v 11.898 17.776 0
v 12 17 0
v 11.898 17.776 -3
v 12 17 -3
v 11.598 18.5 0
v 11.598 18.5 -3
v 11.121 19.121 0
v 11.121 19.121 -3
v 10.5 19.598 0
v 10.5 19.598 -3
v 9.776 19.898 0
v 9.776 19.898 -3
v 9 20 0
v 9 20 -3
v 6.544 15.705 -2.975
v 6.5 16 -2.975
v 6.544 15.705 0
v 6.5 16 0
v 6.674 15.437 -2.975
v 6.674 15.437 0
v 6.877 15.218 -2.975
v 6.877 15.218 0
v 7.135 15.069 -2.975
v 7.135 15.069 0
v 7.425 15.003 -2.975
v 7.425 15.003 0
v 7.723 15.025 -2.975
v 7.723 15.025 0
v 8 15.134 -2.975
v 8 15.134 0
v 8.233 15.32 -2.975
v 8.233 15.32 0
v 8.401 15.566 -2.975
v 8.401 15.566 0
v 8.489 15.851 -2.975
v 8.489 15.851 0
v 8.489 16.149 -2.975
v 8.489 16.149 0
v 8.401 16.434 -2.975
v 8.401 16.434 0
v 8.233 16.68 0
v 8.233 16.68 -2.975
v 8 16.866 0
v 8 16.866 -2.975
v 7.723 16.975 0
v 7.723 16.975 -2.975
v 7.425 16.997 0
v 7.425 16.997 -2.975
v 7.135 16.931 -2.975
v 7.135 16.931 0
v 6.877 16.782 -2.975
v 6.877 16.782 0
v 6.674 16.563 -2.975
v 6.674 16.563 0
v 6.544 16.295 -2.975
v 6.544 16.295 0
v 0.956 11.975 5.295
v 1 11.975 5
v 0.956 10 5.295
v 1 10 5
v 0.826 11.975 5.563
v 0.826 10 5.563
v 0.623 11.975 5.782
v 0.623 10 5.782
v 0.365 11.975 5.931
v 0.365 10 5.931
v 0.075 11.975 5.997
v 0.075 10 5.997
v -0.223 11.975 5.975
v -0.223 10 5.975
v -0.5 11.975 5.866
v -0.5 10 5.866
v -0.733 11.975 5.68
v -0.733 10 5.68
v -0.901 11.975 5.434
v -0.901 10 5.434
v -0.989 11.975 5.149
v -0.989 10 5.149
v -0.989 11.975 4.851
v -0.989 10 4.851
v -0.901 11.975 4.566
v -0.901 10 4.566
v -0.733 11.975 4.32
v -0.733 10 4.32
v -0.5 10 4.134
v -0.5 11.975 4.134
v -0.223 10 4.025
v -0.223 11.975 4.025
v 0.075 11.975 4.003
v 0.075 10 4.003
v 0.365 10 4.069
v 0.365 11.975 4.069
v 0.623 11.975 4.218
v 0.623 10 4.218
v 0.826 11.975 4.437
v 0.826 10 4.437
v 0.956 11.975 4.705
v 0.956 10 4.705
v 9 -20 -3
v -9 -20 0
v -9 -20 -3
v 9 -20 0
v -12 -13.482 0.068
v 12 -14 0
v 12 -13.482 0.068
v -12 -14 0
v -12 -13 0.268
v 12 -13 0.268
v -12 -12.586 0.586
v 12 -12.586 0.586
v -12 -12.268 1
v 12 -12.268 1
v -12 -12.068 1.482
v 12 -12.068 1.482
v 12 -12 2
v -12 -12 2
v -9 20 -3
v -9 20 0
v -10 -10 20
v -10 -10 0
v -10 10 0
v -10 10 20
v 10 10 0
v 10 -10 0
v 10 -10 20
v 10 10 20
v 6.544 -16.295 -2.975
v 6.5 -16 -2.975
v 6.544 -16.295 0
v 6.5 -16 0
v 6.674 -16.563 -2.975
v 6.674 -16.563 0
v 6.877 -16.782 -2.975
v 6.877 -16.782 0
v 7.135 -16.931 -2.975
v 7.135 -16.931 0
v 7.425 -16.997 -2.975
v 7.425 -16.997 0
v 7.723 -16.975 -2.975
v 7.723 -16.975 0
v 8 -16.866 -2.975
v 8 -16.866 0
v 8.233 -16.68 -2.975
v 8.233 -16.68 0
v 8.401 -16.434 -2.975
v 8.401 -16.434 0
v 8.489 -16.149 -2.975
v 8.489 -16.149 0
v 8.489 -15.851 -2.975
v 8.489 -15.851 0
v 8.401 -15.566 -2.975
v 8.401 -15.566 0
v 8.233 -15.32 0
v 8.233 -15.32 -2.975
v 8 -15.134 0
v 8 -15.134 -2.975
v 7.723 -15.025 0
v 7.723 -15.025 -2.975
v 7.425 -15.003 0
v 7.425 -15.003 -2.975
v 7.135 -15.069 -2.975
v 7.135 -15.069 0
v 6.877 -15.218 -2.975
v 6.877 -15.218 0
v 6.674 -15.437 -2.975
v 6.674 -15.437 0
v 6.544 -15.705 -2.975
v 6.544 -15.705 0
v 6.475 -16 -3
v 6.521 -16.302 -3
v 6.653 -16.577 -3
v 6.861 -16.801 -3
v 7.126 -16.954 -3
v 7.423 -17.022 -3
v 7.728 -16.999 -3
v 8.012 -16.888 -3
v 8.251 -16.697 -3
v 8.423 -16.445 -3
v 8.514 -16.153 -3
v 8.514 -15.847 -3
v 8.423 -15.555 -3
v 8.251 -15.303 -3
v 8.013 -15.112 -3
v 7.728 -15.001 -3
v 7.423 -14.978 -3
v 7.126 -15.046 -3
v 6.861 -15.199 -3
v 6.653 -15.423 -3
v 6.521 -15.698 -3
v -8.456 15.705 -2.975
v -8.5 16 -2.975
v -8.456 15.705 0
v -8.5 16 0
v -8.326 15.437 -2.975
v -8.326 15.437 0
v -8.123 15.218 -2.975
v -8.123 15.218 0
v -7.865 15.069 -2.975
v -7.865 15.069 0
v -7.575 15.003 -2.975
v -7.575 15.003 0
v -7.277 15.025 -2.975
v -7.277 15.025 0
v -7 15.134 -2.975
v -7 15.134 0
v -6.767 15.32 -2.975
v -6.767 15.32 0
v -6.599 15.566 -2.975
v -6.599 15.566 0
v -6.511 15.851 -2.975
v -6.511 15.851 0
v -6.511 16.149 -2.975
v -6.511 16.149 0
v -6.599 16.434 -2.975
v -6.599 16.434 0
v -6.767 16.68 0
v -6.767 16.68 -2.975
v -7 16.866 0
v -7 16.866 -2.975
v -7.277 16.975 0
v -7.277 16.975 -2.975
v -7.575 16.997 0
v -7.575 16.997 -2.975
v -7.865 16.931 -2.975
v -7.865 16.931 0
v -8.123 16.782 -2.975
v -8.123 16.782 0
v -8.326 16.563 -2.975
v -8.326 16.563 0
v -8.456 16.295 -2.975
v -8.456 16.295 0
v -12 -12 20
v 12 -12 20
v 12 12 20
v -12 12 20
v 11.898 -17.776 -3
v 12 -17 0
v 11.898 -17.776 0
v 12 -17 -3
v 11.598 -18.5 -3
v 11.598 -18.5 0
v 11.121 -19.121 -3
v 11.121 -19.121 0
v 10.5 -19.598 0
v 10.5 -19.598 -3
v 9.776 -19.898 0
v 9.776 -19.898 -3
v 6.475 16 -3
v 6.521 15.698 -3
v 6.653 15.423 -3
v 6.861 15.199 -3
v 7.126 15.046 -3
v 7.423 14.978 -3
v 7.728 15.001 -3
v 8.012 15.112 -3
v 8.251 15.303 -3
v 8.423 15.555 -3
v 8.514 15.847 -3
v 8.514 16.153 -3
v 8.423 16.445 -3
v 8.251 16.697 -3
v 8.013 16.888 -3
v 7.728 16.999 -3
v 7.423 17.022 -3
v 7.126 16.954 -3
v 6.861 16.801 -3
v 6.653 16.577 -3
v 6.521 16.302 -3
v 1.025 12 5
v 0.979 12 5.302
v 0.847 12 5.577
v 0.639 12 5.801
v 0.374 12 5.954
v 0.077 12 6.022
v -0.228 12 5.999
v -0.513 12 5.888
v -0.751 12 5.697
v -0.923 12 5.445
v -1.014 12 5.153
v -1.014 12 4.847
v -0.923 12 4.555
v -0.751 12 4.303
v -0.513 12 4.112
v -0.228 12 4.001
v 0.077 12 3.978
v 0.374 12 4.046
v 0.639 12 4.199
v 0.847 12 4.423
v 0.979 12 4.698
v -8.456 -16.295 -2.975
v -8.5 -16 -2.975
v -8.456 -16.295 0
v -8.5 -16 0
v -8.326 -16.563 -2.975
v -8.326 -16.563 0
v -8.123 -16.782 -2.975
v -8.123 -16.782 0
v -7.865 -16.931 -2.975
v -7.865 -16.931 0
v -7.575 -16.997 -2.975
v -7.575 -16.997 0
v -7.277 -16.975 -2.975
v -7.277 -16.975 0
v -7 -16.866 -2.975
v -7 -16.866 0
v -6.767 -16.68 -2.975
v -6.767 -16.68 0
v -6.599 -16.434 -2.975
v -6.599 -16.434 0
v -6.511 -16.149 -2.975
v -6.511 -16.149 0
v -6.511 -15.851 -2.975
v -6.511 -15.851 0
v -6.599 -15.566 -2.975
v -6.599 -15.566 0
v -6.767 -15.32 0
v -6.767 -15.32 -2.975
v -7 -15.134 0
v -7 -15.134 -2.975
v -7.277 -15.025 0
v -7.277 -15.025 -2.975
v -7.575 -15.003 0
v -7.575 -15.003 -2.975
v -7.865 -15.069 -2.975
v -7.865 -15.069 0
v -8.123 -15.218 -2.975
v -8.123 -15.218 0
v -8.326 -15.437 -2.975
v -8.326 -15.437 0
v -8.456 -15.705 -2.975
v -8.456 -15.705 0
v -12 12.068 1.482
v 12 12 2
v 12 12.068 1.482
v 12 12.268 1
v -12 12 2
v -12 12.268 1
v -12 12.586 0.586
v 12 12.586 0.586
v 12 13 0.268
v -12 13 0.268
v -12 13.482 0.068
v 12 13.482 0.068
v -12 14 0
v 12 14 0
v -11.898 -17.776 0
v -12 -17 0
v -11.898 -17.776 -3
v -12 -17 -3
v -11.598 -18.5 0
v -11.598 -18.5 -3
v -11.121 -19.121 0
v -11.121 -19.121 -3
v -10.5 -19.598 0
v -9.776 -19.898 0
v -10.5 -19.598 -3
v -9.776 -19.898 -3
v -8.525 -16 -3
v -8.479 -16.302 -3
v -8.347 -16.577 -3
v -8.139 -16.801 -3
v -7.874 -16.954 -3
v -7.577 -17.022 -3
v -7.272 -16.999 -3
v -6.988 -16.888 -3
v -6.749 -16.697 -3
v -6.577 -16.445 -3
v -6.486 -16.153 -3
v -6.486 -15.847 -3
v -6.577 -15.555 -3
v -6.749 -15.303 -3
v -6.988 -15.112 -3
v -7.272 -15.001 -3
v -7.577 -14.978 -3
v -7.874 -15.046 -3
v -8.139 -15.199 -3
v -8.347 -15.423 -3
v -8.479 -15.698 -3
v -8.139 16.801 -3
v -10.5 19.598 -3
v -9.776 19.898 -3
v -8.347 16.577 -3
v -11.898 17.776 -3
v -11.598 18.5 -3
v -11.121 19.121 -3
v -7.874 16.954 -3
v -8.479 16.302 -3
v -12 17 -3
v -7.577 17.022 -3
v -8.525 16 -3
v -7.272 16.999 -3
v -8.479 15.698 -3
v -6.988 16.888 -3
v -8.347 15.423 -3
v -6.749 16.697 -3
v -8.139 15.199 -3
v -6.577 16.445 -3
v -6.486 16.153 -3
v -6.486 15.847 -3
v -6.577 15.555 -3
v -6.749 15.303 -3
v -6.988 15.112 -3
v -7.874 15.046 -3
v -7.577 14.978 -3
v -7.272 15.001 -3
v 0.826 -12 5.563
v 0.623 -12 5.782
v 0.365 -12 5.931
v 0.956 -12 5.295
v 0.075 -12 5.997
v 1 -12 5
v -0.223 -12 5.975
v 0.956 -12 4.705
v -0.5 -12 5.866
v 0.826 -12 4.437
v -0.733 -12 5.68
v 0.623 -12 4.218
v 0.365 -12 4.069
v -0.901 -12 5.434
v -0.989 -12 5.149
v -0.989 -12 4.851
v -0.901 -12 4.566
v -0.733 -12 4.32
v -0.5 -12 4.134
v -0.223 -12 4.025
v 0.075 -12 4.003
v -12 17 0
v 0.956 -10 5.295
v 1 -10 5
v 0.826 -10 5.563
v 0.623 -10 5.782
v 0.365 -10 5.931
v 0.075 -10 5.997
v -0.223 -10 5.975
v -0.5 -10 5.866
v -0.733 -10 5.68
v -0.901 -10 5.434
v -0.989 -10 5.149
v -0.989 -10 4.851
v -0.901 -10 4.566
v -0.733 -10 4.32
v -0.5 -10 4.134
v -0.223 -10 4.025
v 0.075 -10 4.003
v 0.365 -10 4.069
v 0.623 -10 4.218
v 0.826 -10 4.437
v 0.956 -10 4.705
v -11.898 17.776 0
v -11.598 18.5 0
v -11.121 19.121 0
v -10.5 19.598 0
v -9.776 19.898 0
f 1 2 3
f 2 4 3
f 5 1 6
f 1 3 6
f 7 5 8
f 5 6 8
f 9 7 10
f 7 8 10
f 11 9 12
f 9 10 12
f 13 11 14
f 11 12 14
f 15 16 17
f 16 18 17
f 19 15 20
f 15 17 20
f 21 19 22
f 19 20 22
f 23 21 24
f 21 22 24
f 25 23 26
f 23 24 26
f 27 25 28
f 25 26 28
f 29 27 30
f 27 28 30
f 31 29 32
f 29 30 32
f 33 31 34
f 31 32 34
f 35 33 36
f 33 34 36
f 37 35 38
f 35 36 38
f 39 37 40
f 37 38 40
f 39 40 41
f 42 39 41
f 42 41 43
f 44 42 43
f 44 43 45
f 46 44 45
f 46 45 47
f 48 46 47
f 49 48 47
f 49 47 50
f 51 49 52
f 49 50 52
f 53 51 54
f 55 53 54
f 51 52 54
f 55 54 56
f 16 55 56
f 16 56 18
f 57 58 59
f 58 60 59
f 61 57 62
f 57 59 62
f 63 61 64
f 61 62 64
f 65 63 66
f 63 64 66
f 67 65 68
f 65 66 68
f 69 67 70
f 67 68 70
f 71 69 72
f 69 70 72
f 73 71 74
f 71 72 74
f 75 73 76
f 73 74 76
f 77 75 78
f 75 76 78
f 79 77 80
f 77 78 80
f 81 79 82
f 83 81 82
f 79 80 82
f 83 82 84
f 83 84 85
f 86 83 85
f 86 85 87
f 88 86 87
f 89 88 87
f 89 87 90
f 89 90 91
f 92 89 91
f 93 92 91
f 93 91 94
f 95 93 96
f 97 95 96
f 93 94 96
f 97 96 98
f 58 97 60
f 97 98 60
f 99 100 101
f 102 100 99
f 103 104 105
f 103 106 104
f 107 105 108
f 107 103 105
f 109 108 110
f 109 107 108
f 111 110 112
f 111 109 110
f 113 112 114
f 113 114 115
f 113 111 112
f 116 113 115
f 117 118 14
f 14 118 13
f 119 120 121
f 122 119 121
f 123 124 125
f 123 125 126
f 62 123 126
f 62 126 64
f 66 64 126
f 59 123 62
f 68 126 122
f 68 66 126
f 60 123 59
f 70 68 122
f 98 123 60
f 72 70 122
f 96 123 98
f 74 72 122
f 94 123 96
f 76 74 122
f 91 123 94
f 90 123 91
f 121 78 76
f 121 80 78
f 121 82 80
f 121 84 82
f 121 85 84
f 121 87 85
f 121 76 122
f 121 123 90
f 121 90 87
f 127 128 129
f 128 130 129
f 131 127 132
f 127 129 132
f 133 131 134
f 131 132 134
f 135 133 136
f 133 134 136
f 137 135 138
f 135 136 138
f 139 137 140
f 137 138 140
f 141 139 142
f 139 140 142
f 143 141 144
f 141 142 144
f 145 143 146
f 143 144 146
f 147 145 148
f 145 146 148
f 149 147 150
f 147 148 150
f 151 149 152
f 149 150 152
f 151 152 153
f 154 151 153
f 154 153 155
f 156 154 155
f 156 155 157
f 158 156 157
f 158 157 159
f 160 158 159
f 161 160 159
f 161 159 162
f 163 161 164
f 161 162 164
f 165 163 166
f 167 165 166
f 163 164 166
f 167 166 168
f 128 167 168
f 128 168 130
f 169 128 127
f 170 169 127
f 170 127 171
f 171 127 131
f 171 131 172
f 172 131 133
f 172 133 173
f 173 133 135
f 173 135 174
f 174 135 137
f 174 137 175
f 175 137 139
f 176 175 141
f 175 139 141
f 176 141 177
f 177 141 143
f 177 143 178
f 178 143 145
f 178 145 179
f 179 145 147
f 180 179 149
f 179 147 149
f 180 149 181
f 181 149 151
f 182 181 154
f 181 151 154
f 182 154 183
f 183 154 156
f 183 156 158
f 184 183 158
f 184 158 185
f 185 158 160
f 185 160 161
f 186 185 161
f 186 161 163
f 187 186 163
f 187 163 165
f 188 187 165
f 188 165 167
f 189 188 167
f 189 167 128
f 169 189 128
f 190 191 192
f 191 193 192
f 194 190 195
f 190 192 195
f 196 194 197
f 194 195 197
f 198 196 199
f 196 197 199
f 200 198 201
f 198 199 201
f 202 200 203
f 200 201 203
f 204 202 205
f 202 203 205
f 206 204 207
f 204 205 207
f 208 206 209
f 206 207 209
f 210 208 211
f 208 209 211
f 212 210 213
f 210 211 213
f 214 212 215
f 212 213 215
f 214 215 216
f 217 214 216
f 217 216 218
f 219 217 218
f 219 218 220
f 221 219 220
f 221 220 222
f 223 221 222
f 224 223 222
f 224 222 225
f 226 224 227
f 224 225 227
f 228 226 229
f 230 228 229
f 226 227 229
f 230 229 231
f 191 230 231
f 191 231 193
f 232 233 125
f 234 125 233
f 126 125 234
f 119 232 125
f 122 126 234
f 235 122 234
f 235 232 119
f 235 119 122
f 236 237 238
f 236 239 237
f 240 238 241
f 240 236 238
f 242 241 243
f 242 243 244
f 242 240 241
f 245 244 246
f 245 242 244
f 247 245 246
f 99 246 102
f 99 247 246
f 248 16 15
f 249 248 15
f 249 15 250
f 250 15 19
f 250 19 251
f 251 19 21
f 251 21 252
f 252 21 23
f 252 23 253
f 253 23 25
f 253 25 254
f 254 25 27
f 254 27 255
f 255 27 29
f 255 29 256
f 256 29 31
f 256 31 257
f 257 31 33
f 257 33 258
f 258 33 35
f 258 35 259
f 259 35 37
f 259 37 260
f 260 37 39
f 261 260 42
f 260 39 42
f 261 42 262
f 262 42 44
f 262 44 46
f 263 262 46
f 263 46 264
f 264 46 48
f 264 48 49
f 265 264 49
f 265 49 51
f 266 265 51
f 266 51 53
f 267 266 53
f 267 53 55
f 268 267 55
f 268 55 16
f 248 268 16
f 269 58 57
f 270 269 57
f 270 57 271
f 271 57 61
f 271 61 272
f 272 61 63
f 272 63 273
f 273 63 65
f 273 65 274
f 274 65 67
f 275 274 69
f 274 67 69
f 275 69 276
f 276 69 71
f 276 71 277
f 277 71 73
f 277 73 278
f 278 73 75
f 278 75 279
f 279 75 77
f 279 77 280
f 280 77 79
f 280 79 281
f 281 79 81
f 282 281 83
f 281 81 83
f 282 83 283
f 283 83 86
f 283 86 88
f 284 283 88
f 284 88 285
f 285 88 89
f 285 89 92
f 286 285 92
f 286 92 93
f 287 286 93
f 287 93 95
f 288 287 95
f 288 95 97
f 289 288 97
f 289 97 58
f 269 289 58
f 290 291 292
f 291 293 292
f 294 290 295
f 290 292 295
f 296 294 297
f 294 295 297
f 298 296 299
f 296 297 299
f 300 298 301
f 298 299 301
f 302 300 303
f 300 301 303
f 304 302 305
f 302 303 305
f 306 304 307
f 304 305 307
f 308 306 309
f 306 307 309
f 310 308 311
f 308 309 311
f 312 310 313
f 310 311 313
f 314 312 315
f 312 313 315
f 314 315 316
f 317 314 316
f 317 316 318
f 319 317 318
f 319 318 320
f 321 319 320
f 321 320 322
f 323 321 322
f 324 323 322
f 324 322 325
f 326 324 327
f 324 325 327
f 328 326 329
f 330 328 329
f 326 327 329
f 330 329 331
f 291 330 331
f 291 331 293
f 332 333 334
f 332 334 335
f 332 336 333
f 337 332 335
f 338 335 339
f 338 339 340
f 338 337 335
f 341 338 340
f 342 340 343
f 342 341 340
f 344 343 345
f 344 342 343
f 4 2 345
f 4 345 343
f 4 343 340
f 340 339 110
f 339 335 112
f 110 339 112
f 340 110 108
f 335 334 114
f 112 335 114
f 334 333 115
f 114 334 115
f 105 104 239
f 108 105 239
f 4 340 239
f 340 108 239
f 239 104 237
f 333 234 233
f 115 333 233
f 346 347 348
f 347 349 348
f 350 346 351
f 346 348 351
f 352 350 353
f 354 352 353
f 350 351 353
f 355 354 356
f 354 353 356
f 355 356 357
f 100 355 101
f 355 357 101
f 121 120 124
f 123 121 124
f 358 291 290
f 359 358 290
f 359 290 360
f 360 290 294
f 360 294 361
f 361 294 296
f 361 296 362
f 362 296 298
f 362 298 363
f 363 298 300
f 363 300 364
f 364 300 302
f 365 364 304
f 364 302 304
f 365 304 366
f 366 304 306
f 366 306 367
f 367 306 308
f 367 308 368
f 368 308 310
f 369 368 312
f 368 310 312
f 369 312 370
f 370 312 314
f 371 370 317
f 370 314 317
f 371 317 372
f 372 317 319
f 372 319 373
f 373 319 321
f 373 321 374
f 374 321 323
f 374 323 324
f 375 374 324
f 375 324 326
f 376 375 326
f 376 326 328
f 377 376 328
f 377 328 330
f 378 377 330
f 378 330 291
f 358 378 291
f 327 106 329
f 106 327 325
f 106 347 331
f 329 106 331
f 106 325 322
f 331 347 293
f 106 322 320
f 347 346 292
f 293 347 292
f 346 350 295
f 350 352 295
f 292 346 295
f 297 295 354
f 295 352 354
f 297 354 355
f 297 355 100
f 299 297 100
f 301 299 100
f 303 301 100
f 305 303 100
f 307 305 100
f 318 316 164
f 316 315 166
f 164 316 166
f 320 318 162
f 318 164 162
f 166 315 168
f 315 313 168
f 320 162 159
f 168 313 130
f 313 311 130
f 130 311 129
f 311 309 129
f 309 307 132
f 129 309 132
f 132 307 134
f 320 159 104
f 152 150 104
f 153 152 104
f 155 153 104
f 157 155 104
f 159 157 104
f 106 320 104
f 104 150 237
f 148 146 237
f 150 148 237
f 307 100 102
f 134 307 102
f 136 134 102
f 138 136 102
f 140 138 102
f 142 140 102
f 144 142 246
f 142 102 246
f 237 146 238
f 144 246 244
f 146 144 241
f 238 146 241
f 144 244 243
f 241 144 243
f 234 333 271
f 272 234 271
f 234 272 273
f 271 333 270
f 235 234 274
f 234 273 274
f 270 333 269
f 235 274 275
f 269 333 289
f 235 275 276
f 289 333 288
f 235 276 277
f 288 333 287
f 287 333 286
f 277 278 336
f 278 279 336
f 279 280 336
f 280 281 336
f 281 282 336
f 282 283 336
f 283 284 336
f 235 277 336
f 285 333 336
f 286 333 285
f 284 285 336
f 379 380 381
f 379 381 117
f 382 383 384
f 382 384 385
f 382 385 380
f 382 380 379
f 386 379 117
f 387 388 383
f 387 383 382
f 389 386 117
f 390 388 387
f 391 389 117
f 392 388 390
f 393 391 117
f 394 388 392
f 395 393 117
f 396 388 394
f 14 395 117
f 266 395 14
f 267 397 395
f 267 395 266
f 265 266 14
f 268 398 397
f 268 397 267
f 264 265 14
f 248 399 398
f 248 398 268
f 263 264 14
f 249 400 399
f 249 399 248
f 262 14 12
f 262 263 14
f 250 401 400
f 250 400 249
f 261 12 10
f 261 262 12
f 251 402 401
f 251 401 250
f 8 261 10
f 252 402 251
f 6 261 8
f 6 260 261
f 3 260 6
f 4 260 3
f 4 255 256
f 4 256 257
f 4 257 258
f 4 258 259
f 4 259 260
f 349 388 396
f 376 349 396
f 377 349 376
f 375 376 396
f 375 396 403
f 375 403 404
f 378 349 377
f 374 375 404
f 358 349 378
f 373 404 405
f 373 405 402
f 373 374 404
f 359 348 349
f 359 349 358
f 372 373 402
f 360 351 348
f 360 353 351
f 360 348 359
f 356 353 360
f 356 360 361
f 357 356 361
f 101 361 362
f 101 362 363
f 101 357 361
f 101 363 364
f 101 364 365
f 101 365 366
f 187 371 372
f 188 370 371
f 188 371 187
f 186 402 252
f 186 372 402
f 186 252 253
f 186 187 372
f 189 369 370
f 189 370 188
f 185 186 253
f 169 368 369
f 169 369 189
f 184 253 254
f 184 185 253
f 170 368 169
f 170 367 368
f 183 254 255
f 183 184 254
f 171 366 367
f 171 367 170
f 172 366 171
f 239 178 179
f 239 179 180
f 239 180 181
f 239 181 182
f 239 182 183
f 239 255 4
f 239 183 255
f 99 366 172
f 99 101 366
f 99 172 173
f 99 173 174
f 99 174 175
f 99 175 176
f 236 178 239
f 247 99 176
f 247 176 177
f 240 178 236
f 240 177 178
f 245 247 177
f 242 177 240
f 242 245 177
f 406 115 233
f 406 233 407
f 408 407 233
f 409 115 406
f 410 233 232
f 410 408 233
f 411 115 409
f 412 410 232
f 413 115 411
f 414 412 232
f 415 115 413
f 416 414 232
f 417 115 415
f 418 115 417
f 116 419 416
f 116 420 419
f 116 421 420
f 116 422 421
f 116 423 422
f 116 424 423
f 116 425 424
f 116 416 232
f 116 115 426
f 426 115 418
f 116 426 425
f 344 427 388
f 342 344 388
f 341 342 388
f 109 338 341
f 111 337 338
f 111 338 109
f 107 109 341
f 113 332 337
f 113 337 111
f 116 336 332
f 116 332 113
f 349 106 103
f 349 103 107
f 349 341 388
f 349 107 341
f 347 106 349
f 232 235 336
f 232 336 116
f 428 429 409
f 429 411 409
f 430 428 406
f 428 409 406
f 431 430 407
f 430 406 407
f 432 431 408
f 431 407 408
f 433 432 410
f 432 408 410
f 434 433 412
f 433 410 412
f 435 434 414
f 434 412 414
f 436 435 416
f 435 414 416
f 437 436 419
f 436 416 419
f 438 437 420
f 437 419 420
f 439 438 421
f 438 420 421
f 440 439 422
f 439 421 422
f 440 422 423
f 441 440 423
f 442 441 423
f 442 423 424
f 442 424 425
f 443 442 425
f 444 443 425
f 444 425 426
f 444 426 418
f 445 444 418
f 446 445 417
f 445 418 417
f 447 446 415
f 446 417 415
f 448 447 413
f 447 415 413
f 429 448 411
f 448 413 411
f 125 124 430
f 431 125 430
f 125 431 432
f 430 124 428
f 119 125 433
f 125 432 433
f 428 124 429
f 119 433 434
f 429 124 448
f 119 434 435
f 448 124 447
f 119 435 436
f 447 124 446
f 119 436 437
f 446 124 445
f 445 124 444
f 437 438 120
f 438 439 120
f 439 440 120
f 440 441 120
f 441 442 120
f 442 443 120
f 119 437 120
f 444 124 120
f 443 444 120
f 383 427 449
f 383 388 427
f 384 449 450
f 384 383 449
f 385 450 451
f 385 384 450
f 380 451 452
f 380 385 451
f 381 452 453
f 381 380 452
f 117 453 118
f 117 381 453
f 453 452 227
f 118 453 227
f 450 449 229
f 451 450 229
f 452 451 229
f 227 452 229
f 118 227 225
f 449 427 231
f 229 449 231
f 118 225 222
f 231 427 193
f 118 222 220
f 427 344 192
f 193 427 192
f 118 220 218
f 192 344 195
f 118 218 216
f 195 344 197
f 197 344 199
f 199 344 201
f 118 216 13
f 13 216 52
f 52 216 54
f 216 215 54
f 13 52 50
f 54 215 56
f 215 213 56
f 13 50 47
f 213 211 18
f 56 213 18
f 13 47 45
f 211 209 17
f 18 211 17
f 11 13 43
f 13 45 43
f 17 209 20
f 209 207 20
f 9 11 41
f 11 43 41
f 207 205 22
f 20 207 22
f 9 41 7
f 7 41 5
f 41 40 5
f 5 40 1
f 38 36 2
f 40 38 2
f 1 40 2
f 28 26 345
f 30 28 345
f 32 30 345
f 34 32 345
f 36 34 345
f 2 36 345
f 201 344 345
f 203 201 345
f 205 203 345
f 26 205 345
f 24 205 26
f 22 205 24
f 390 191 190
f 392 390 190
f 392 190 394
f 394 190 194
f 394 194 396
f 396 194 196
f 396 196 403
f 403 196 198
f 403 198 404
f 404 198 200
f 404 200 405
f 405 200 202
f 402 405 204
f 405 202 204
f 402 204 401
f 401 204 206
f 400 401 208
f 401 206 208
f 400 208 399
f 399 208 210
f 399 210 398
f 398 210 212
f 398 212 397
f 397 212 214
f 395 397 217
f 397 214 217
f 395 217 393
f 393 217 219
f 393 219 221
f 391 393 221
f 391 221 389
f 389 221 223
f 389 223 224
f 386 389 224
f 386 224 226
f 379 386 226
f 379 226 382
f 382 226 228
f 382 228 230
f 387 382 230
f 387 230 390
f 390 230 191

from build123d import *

# Parameters (mm, degrees)
SKETCH1_W                       = 24
SKETCH1_H                       = 24
SKETCH1_W_2                     = 20
SKETCH1_H_2                     = 20
BOSS_EXTRUDE1_DEPTH             = 20
SKETCH2_W                       = 24
SKETCH2_H                       = 8
SKETCH2_H_2                     = 24
SKETCH2_W_2                     = 20
SKETCH2_H_3                     = 20
BOSS_EXTRUDE2_DEPTH             = 3
F_2_0MM_DOWEL_HOLE1_D           = 2
F_2_0MM_DOWEL_HOLE1_CSINK_D     = 2.05
F_2_0MM_DOWEL_HOLE1_CSINK_ANGLE = 90
F_2_0MM_DOWEL_HOLE2_D           = 2
F_2_0MM_DOWEL_HOLE2_CSINK_D     = 2.05
F_2_0MM_DOWEL_HOLE2_CSINK_ANGLE = 90
FILLET1_R                       = 3
FILLET2_R                       = 2


with BuildPart() as part:
    # Sketch1 → Boss-Extrude1 (new body)
    with BuildSketch(Plane(origin=(0, 0, 0), x_dir=(0, 1, 0), z_dir=(0, 0, 1))):
        Rectangle(SKETCH1_W, SKETCH1_H)
        Rectangle(SKETCH1_W_2, SKETCH1_H_2, mode=Mode.SUBTRACT)
    extrude(amount=BOSS_EXTRUDE1_DEPTH)

    # Sketch2 → Boss-Extrude2 (add)
    # profile 1 of 4: a face of its own
    with BuildSketch(Plane(origin=(0, 0, 0), x_dir=(1, 0, 0), z_dir=(0, 0, -1))):
        with Locations((0, 16)):
            Rectangle(SKETCH2_W, SKETCH2_H)
    # profile 2 of 4: a face of its own
    with BuildSketch(Plane(origin=(0, 0, 0), x_dir=(1, 0, 0), z_dir=(0, 0, -1))):
        with Locations((0, -16)):
            Rectangle(SKETCH2_W, SKETCH2_H)
    # profile 3 of 4: a face of its own
    with BuildSketch(Plane(origin=(0, 0, 0), x_dir=(1, 0, 0), z_dir=(0, 0, -1))):
        Rectangle(SKETCH2_W, SKETCH2_H_2)
        Rectangle(SKETCH2_W_2, SKETCH2_H_3, mode=Mode.SUBTRACT)
    # profile 4 of 4: a face of its own
    with BuildSketch(Plane(origin=(0, 0, 0), x_dir=(1, 0, 0), z_dir=(0, 0, -1))):
        Rectangle(SKETCH2_W_2, SKETCH2_H_3)
    extrude(amount=BOSS_EXTRUDE2_DEPTH)

    # Ø2.0mm Dowel Hole1 (through all)
    with Locations(Plane(origin=(0, 0, -3), x_dir=(1, 0, 0), z_dir=(0, 0, -1))):
        with Locations((7.5, -16), (-27.524465522, 46.822395407), (-7.5, 16), (7.5, 16), (-7.5, -16)):
            CounterSinkHole(F_2_0MM_DOWEL_HOLE1_D / 2, F_2_0MM_DOWEL_HOLE1_CSINK_D / 2, counter_sink_angle=F_2_0MM_DOWEL_HOLE1_CSINK_ANGLE)

    # Ø2.0mm Dowel Hole2 (through all)
    with Locations(Plane(origin=(0, 12, 0), x_dir=(-1, 0, 0), z_dir=(0, 1, 0))):
        with Locations((0, 5)):
            CounterSinkHole(F_2_0MM_DOWEL_HOLE2_D / 2, F_2_0MM_DOWEL_HOLE2_CSINK_D / 2, counter_sink_angle=F_2_0MM_DOWEL_HOLE2_CSINK_ANGLE)

    # Fillet1
    fillet1_edges = [part.edges().sort_by_distance(p)[0] for p in [
        (12, -20, -1.5),
        (-12, -20, -1.5),
        (-12, 20, -1.5),
        (12, 20, -1.5),
    ]]
    fillet(fillet1_edges, radius=FILLET1_R)

    # Fillet2
    fillet2_edges = [part.edges().sort_by_distance(p)[0] for p in [
        (0, 12, 0),
        (0, -12, 0),
    ]]
    fillet(fillet2_edges, radius=FILLET2_R)


solid = part.part
